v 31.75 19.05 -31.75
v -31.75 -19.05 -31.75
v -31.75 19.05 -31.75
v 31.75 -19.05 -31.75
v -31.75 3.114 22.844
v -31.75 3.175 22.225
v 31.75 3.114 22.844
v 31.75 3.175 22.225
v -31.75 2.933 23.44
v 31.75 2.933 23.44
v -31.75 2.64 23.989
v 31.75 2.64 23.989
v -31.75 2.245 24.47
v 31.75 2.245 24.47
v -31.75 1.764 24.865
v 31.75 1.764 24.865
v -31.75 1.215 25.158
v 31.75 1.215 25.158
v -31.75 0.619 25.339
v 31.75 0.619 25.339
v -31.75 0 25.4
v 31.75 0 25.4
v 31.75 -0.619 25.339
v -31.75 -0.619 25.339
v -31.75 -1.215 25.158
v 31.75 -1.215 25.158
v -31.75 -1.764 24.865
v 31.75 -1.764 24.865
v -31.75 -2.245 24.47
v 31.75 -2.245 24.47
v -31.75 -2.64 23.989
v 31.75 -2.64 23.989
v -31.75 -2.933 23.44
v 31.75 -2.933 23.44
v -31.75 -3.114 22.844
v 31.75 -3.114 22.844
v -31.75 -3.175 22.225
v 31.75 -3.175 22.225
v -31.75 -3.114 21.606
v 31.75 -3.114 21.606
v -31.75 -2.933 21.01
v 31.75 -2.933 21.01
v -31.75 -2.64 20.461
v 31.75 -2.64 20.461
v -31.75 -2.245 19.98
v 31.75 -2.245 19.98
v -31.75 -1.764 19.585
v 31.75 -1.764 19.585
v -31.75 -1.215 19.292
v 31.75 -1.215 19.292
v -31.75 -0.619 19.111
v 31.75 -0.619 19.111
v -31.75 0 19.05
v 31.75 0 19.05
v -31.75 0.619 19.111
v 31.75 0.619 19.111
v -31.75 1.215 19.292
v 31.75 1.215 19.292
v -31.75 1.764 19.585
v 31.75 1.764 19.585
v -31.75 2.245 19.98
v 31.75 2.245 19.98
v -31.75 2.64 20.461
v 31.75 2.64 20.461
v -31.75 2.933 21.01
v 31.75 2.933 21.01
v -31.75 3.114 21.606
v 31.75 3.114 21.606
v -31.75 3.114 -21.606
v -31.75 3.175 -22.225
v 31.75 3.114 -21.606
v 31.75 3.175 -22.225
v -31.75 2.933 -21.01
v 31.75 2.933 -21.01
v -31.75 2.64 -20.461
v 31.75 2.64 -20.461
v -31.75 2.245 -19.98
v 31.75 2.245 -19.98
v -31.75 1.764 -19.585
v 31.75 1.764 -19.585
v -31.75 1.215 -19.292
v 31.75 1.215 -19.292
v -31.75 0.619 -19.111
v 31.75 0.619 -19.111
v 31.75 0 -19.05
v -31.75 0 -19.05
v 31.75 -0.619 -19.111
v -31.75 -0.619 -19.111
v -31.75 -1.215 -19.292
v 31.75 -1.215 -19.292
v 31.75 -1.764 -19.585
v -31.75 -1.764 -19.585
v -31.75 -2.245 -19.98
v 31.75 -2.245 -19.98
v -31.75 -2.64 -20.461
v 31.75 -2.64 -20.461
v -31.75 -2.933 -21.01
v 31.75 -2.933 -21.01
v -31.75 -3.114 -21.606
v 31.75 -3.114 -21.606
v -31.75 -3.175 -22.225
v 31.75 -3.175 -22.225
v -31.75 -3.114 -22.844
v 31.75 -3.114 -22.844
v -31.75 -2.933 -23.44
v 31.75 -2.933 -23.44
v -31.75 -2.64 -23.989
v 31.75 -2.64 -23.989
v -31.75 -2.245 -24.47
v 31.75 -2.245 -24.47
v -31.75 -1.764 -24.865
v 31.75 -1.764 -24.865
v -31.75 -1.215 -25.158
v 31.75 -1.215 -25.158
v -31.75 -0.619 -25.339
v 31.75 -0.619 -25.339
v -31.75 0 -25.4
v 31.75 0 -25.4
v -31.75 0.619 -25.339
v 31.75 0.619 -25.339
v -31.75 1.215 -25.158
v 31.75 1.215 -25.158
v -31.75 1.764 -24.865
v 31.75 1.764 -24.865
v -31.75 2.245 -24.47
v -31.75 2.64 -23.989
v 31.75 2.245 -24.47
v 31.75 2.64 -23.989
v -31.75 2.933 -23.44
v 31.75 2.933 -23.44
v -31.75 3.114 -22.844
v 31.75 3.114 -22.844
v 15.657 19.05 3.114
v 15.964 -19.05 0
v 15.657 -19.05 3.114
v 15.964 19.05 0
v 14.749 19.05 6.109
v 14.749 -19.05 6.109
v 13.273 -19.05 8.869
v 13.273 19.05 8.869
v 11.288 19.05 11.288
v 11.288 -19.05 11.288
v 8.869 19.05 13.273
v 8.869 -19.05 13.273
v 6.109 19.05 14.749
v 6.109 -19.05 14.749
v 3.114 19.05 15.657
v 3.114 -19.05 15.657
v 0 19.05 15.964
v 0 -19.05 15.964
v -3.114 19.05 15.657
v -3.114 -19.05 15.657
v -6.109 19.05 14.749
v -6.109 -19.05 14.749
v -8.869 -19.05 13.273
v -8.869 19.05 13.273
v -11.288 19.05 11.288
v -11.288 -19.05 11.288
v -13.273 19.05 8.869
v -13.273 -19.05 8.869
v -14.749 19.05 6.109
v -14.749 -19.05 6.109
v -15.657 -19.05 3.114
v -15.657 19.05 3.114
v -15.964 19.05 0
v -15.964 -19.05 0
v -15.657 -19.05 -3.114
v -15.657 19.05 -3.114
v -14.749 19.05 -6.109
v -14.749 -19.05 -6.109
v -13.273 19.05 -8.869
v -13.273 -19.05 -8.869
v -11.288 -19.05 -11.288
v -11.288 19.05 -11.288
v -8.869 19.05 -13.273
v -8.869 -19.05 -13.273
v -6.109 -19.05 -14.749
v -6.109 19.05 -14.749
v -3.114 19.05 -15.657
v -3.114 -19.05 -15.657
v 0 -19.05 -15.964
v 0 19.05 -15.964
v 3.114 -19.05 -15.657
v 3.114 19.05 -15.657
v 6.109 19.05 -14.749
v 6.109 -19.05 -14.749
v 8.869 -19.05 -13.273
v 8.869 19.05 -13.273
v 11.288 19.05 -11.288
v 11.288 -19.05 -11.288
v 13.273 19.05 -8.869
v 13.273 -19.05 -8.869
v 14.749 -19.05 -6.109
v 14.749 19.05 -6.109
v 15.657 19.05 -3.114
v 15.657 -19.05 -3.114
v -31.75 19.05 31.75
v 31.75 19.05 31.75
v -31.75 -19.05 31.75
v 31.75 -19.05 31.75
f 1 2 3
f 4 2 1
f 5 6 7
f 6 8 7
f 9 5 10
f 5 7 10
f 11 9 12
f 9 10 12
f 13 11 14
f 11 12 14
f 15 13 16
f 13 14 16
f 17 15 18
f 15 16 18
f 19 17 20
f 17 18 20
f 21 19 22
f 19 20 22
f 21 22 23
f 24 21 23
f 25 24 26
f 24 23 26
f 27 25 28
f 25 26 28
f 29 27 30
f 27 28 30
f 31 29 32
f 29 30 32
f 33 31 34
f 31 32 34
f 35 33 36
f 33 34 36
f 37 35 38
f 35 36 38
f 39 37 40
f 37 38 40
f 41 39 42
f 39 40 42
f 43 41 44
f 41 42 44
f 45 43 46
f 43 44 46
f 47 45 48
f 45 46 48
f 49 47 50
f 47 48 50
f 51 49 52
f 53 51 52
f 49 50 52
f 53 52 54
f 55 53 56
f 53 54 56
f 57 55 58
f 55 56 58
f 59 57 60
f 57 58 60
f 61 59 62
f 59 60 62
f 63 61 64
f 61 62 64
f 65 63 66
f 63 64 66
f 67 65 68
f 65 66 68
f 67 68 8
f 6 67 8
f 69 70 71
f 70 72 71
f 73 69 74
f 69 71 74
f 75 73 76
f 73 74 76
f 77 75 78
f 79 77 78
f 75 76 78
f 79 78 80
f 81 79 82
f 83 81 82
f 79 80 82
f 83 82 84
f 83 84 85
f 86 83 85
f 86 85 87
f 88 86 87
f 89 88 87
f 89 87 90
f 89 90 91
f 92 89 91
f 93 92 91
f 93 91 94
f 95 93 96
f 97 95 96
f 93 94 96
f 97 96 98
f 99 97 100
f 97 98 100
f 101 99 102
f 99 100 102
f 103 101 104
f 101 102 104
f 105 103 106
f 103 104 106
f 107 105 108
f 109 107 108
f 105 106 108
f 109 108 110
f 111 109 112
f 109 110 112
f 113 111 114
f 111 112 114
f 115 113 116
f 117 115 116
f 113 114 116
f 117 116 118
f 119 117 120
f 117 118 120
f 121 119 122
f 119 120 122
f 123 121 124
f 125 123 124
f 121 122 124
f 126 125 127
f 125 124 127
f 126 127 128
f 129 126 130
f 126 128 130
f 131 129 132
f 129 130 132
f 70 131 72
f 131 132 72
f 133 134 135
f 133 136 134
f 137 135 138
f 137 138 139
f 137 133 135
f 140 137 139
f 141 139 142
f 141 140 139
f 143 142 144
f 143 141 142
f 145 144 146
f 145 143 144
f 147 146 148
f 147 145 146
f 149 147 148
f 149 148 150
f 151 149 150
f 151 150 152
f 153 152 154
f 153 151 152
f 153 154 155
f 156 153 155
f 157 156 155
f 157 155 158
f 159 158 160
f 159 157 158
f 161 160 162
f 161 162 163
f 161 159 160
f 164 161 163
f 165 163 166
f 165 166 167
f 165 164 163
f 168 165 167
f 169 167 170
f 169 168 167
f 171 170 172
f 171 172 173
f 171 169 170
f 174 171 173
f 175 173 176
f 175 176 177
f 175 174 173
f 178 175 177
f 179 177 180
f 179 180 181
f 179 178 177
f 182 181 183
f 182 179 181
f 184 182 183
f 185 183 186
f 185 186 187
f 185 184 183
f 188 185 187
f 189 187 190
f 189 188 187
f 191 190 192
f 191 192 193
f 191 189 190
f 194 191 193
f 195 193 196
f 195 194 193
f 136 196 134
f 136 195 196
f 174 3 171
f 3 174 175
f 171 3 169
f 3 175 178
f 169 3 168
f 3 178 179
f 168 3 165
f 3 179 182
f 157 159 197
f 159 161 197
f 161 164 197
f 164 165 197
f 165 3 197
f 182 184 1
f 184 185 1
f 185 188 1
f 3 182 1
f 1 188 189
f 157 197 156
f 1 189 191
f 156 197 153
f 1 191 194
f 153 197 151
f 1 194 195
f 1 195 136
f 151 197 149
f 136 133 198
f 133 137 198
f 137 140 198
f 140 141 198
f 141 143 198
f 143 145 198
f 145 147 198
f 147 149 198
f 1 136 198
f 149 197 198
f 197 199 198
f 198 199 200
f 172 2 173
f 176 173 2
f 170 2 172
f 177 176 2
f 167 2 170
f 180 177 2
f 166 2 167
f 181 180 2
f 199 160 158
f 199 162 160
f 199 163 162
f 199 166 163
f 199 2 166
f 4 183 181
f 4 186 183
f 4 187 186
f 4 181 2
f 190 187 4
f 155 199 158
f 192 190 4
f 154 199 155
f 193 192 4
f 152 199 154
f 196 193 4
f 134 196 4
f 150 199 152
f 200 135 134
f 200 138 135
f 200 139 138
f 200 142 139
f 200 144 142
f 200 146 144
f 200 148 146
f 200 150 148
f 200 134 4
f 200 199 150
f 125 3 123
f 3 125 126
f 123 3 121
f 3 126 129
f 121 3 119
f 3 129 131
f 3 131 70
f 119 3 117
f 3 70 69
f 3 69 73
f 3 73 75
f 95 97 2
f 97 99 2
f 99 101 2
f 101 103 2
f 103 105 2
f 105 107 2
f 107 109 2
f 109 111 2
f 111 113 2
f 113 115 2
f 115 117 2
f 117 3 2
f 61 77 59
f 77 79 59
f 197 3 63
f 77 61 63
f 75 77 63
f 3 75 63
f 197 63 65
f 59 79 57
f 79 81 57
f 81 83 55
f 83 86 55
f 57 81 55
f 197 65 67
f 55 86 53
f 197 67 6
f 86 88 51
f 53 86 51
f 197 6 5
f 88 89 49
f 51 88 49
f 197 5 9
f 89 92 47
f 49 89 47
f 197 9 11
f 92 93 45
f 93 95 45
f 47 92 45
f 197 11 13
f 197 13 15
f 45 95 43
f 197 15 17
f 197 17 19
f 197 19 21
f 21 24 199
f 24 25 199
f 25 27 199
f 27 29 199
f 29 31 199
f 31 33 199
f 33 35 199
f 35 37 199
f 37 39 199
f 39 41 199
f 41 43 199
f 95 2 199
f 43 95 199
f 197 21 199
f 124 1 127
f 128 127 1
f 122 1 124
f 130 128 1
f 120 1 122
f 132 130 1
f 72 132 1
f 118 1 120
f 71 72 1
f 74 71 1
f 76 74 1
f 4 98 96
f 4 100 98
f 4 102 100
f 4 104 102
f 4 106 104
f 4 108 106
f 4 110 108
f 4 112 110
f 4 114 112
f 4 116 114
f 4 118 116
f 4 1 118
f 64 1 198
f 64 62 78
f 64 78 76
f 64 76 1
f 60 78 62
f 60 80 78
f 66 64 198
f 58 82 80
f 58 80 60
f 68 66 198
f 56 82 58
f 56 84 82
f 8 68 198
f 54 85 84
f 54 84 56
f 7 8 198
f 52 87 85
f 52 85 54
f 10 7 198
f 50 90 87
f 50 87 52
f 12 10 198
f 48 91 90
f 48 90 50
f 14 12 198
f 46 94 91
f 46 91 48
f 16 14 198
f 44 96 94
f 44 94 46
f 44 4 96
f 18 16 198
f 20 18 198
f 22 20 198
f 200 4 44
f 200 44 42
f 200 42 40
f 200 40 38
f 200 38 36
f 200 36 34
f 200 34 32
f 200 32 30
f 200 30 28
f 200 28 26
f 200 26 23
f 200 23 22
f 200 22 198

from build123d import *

# Parameters (mm, degrees)
F0_W     = 63.5
F0_H     = 63.5
F0_R     = 15.9639
F1_DEPTH = 19.05
F2_R     = 3.175
F3_DEPTH = 34.925


with BuildPart() as f1:
    # F0 (on Front) → F1 (new body, symmetric)
    with BuildSketch(Plane.XZ):
        Rectangle(F0_W, F0_H)
        Circle(F0_R, mode=Mode.SUBTRACT)
    extrude(amount=F1_DEPTH, both=True)

    # F2 (on Right) → F3 (cut, symmetric)
    with BuildSketch(Plane.YZ):
        with Locations((0, 22.225)):
            Circle(F2_R)
        with Locations((0, -22.225)):
            Circle(F2_R)
    extrude(amount=F3_DEPTH, both=True, mode=Mode.SUBTRACT)


solid = f1.part
